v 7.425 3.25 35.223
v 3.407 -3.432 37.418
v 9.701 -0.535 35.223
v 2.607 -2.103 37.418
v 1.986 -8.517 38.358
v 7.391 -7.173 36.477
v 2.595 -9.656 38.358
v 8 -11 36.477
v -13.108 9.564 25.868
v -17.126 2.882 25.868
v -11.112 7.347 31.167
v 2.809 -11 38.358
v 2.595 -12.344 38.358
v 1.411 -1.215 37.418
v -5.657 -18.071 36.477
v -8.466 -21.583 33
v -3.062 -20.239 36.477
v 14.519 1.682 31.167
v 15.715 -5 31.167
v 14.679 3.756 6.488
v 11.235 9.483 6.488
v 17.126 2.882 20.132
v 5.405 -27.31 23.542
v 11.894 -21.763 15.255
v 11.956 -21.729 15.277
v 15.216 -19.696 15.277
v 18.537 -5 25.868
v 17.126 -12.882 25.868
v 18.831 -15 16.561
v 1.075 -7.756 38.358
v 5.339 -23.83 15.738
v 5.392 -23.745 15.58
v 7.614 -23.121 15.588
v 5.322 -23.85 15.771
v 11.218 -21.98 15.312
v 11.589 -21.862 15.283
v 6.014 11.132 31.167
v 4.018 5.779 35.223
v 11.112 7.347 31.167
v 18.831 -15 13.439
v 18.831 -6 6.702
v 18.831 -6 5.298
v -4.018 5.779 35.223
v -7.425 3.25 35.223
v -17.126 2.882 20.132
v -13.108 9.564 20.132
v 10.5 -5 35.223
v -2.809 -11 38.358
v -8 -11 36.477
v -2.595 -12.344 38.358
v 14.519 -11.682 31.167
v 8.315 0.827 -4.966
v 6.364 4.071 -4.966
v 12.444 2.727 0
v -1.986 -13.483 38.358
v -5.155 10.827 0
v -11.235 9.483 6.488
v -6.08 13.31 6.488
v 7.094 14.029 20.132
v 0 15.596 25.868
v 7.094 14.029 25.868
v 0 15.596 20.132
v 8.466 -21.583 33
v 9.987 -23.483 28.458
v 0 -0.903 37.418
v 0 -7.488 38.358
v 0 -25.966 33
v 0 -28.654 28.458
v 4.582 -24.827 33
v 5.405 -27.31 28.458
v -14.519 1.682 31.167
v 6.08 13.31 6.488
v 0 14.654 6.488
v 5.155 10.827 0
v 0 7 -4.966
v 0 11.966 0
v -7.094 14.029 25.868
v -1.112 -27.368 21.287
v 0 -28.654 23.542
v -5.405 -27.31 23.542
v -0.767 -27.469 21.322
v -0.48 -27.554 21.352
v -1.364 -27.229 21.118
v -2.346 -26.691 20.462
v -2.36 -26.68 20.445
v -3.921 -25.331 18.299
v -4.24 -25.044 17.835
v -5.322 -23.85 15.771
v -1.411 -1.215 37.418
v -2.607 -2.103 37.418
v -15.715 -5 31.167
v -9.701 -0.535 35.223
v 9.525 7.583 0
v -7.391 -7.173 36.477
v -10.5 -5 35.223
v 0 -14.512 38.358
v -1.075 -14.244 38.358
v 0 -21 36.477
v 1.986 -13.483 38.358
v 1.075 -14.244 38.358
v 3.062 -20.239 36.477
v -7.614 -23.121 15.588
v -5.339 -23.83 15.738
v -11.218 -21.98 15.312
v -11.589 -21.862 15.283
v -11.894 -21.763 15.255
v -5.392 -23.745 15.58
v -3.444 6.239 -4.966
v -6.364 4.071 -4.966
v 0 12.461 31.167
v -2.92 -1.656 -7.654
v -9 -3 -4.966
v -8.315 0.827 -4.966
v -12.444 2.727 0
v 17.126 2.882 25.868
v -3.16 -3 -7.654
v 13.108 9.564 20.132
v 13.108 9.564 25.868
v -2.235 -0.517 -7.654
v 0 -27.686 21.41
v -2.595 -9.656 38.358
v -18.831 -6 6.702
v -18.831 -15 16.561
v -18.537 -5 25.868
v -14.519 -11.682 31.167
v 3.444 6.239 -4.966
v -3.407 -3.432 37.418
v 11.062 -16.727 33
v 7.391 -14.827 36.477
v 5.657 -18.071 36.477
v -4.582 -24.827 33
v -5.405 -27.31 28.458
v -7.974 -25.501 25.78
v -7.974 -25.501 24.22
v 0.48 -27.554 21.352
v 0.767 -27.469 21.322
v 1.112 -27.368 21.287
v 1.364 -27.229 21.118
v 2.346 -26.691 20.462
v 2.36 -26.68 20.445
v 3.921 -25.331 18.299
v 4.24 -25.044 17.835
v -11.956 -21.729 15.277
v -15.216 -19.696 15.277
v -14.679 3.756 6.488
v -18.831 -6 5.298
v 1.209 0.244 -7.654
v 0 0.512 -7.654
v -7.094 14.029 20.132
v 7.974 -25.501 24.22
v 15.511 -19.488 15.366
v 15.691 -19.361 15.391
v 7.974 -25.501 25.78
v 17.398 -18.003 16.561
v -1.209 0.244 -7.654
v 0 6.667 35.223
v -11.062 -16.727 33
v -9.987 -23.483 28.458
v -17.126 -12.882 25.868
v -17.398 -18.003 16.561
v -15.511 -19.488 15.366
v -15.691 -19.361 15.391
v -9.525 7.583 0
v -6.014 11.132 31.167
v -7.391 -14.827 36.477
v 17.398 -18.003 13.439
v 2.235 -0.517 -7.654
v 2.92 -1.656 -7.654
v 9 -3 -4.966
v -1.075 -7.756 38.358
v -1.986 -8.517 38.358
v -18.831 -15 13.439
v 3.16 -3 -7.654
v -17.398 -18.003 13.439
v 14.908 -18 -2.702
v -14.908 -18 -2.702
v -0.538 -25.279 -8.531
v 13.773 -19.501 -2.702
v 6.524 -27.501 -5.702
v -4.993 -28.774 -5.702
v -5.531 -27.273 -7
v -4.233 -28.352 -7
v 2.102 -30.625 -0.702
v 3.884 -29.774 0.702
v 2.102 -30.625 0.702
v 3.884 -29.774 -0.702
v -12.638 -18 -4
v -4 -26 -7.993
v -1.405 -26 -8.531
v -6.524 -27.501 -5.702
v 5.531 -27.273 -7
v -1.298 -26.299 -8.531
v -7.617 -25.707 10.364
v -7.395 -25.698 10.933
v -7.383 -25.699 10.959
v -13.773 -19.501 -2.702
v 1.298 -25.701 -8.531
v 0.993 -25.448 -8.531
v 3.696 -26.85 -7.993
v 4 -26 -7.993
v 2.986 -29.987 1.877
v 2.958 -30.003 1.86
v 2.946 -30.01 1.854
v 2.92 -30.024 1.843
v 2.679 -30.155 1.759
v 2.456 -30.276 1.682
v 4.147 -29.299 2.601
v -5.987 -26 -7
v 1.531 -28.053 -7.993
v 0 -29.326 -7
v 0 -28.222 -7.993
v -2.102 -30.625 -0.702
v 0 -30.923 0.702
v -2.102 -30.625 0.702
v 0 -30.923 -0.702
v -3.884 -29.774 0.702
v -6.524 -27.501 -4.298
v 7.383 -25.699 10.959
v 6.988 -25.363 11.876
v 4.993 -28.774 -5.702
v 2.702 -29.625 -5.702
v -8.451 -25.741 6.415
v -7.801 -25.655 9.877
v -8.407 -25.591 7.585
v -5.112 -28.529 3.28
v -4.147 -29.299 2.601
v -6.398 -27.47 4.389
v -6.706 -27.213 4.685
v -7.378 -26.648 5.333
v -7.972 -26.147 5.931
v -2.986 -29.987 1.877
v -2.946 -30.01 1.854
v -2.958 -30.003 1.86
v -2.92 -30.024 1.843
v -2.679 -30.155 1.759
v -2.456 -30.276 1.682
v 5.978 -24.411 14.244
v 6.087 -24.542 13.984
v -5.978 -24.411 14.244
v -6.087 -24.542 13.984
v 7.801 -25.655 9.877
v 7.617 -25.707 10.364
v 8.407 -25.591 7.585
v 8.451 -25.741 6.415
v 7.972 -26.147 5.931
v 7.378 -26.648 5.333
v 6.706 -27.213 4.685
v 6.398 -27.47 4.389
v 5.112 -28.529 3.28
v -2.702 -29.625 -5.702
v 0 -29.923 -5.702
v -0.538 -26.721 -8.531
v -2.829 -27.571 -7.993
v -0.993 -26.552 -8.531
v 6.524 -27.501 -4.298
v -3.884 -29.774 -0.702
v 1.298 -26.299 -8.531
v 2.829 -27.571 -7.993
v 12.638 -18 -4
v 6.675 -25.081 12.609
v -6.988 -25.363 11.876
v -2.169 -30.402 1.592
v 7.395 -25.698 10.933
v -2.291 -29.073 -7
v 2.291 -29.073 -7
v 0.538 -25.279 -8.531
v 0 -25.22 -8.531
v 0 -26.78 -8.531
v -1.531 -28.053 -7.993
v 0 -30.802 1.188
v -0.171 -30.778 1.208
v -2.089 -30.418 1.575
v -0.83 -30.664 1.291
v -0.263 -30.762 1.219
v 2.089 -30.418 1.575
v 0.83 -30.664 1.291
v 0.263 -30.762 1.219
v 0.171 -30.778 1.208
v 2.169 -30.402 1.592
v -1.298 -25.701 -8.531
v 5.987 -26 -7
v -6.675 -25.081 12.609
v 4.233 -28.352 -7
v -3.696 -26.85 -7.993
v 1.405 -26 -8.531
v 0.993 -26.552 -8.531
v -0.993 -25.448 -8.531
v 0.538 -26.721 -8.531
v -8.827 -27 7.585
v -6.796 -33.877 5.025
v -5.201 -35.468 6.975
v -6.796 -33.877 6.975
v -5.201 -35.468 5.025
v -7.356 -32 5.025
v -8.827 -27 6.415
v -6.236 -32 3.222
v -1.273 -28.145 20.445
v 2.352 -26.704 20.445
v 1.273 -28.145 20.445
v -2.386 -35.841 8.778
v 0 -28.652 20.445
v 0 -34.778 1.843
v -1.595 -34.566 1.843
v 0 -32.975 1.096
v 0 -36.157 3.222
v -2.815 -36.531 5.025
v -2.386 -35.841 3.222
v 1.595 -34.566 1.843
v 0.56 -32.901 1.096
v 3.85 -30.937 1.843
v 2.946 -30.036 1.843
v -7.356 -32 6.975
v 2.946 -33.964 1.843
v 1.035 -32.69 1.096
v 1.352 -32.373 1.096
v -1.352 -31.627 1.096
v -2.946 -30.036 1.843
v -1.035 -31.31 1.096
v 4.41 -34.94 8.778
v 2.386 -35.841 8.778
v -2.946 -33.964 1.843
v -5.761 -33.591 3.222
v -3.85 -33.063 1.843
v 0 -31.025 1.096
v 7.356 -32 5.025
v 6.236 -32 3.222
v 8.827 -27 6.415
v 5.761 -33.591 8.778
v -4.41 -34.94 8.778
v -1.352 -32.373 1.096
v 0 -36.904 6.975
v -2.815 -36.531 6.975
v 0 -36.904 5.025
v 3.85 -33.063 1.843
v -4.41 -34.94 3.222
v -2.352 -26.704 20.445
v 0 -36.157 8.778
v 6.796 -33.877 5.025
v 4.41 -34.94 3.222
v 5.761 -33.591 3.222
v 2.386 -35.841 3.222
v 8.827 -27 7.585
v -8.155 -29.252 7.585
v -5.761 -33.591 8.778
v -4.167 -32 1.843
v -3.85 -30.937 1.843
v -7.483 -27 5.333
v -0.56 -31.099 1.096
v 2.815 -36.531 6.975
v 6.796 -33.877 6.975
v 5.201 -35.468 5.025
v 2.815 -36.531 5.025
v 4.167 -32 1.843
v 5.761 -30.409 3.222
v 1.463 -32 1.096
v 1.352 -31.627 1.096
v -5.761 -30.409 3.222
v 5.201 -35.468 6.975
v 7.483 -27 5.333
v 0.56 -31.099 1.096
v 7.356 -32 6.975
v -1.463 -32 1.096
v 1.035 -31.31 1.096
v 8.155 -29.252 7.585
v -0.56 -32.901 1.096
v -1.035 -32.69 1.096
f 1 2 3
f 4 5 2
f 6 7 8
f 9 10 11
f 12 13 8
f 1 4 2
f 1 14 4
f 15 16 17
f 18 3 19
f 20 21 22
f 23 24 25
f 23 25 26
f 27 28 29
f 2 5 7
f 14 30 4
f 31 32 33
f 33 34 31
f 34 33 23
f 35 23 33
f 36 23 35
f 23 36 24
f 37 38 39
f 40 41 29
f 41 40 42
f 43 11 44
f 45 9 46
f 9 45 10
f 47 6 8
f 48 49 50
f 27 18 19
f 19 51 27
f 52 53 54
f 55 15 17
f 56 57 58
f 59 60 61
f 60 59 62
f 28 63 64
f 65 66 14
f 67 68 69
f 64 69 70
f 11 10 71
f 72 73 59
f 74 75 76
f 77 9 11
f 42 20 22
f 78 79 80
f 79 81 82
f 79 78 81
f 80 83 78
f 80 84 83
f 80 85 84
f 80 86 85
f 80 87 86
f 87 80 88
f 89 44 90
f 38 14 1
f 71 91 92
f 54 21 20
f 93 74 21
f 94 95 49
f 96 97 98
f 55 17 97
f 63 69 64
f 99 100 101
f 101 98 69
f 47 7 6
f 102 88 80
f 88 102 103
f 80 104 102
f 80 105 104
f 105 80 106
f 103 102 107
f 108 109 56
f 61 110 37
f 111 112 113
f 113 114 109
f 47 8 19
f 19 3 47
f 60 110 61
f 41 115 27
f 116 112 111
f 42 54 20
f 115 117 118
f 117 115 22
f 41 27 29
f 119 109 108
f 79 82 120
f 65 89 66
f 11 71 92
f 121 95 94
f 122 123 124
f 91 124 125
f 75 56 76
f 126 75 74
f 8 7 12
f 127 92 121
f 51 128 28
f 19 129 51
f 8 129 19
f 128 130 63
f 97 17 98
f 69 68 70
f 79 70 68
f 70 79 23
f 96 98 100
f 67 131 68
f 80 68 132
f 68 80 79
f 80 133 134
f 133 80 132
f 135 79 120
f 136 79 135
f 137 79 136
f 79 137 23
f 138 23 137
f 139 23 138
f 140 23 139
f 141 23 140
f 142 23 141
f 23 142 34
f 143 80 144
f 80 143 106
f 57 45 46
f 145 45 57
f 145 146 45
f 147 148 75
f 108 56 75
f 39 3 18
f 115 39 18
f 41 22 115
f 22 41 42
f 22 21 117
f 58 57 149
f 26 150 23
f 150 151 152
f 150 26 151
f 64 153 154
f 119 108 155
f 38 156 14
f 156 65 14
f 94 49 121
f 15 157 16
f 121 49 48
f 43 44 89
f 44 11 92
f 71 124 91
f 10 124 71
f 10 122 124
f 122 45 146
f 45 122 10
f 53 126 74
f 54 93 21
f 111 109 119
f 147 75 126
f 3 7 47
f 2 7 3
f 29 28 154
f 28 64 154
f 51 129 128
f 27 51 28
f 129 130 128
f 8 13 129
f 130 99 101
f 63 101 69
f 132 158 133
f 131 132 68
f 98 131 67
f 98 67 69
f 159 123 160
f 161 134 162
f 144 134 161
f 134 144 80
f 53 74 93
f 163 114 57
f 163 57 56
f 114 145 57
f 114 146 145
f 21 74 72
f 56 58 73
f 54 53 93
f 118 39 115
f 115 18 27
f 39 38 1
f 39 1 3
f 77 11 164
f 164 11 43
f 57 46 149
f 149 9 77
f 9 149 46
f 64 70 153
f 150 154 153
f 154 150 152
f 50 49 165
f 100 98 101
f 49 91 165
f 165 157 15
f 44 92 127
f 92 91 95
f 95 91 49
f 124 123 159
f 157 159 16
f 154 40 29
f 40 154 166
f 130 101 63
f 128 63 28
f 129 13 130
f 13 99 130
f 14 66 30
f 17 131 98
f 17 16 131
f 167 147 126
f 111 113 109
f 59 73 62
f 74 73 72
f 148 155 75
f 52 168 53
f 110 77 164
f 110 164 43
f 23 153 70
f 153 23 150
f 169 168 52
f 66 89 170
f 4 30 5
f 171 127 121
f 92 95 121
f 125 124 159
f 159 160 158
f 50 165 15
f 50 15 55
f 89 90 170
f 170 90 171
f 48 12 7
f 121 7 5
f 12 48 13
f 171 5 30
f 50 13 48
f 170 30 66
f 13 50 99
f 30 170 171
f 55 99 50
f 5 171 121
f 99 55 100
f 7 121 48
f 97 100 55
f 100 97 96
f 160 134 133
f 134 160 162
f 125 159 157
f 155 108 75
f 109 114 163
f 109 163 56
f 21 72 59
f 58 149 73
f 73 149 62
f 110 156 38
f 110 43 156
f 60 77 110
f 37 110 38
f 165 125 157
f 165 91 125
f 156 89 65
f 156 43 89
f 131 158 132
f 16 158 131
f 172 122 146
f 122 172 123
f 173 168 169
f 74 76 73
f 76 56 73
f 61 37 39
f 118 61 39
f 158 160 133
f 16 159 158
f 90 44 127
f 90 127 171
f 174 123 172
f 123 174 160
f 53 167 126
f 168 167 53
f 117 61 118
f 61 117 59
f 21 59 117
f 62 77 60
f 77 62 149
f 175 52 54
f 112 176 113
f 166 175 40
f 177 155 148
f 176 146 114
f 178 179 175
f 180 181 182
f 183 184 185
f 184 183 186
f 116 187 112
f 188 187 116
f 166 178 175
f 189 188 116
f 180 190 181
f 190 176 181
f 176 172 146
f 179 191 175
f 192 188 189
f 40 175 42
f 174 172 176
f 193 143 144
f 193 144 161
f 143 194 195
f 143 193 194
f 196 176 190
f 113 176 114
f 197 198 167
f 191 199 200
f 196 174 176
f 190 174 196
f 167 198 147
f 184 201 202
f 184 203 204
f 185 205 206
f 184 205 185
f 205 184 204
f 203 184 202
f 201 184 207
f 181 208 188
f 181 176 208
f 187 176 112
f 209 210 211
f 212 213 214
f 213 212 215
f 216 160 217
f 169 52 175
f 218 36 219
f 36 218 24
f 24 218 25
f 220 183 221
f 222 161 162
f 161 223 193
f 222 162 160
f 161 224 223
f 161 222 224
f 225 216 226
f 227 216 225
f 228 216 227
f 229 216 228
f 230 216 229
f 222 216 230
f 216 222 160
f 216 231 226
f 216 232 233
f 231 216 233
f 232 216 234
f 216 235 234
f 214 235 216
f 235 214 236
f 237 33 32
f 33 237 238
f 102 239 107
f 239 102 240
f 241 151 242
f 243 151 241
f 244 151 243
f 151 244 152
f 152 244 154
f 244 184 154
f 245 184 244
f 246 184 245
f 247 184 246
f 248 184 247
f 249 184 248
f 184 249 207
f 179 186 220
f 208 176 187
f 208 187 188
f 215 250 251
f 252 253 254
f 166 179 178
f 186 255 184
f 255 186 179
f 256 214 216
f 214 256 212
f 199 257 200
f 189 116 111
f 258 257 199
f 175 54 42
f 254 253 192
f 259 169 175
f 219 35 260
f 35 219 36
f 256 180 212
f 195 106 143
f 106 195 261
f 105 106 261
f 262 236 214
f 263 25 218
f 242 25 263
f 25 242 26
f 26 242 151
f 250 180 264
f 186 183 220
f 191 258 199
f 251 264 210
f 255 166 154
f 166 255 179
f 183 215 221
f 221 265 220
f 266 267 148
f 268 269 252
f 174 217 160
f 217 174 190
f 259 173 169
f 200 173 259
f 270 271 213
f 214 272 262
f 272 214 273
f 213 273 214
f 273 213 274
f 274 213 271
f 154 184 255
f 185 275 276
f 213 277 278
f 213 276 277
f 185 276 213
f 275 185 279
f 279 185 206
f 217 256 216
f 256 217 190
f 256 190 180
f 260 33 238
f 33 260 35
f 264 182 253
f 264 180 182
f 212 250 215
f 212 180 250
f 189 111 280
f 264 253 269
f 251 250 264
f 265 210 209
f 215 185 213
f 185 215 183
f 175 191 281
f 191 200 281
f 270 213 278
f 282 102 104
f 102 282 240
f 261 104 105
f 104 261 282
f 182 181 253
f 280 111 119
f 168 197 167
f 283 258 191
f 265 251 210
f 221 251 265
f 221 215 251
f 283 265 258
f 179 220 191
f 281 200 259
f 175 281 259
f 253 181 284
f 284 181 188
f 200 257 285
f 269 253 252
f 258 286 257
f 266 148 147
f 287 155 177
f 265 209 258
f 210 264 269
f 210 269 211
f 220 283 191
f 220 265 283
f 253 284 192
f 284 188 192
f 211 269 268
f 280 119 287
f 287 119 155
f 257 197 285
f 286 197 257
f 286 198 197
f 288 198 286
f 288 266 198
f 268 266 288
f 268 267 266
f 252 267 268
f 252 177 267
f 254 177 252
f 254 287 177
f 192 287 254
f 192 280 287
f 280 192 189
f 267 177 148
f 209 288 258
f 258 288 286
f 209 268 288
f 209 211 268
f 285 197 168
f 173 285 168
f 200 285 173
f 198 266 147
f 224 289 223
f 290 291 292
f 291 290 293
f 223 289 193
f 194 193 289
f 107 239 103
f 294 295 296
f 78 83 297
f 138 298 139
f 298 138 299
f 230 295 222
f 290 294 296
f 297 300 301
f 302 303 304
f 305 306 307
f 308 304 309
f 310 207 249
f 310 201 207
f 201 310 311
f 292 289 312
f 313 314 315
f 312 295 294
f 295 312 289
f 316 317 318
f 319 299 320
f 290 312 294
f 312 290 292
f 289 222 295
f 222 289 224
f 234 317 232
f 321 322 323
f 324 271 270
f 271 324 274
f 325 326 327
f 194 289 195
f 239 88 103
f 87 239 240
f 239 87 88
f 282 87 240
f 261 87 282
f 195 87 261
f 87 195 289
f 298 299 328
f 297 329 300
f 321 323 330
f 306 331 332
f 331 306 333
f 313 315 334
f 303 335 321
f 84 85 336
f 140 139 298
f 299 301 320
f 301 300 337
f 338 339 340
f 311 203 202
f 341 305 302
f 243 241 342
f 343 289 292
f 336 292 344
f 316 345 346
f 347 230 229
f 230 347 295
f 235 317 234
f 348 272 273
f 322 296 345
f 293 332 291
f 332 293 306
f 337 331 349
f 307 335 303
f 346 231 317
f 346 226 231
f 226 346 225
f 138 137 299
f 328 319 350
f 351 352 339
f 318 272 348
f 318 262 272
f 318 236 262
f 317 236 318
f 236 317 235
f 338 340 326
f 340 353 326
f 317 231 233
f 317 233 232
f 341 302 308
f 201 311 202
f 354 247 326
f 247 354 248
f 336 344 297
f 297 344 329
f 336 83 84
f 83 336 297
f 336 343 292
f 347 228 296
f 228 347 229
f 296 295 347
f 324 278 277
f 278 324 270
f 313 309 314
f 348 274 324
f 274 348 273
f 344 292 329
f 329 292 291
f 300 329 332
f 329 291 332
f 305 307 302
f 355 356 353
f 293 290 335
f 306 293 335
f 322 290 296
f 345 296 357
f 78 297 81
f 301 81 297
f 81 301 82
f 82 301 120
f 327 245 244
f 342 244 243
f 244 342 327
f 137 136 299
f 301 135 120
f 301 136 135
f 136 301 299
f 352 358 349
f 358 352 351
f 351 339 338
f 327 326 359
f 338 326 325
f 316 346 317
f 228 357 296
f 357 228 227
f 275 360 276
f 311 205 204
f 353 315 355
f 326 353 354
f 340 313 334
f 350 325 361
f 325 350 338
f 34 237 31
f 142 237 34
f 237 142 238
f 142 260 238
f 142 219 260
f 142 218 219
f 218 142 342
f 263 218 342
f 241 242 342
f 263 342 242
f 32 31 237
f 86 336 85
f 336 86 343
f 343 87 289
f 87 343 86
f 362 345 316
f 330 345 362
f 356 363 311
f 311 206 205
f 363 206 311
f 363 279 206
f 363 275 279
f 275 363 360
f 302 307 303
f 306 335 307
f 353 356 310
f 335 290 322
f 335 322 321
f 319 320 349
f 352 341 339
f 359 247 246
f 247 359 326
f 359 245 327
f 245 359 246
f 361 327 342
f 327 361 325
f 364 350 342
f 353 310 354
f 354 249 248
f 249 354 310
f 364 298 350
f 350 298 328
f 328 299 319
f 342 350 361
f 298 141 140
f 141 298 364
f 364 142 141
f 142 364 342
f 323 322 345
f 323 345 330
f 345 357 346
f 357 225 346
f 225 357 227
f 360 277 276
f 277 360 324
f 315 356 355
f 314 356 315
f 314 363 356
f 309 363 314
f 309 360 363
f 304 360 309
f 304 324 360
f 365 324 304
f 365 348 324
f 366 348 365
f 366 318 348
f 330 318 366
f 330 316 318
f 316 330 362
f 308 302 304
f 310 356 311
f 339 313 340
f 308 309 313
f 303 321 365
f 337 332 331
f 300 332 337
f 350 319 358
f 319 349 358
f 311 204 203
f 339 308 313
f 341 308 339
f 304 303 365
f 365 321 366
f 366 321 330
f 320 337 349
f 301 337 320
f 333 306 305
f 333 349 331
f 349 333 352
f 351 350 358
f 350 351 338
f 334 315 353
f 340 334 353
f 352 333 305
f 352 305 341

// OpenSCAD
//dwarf head
*translate([-0.9,0,0]) %import("dwarfhead.stl");

$fn=16;
 hull(){
translate([0,-5,23])scale([0.9,1,0.7])sphere(21);
translate([0,-11,26])scale([0.8,1,0.7])sphere(18);

*translate([0,-16,-3])scale([3.8,1,0.9])sphere(4);
translate([0,-6,6])scale([4.8,1,0.9])sphere(4);
translate([0,-3,10])scale([0.9,1,1])sphere(18);
//cheekbone
translate([0,-15,15])scale([4.8,2,2])sphere(4);
translate([0,-24,25])scale([2.2,1,1])sphere(4);
}
//jawline
 hull(){
translate([0,-26,-5])scale([1.8,1,0.9])sphere(4);
translate([0,-18,-2])scale([3.8,1,0.9])sphere(4);
translate([0,-6,6])scale([4.8,1,0.9])sphere(4);
translate([0,-3,10])scale([0.9,1,1])sphere(18);
//cheekbone
translate([0,-15,15])scale([4.8,2,2])sphere(4);
translate([0,-25,8])scale([1.8,1,0.9])sphere(4);
translate([0,-27,-0])scale([1.4,1,0.9])sphere(4);


}
//nose
hull(){
translate([0,-22,16])scale([0.5,1,1])sphere(8);

translate([0,-32,6])scale([1.5,1,1])sphere(5);
translate([0,-28,7])scale([0.5,1,1])sphere(4);
translate([0,-27,7])scale([3,2,1])sphere(3);
translate([0,-29,16])scale([1,1,1])sphere(2);
}
